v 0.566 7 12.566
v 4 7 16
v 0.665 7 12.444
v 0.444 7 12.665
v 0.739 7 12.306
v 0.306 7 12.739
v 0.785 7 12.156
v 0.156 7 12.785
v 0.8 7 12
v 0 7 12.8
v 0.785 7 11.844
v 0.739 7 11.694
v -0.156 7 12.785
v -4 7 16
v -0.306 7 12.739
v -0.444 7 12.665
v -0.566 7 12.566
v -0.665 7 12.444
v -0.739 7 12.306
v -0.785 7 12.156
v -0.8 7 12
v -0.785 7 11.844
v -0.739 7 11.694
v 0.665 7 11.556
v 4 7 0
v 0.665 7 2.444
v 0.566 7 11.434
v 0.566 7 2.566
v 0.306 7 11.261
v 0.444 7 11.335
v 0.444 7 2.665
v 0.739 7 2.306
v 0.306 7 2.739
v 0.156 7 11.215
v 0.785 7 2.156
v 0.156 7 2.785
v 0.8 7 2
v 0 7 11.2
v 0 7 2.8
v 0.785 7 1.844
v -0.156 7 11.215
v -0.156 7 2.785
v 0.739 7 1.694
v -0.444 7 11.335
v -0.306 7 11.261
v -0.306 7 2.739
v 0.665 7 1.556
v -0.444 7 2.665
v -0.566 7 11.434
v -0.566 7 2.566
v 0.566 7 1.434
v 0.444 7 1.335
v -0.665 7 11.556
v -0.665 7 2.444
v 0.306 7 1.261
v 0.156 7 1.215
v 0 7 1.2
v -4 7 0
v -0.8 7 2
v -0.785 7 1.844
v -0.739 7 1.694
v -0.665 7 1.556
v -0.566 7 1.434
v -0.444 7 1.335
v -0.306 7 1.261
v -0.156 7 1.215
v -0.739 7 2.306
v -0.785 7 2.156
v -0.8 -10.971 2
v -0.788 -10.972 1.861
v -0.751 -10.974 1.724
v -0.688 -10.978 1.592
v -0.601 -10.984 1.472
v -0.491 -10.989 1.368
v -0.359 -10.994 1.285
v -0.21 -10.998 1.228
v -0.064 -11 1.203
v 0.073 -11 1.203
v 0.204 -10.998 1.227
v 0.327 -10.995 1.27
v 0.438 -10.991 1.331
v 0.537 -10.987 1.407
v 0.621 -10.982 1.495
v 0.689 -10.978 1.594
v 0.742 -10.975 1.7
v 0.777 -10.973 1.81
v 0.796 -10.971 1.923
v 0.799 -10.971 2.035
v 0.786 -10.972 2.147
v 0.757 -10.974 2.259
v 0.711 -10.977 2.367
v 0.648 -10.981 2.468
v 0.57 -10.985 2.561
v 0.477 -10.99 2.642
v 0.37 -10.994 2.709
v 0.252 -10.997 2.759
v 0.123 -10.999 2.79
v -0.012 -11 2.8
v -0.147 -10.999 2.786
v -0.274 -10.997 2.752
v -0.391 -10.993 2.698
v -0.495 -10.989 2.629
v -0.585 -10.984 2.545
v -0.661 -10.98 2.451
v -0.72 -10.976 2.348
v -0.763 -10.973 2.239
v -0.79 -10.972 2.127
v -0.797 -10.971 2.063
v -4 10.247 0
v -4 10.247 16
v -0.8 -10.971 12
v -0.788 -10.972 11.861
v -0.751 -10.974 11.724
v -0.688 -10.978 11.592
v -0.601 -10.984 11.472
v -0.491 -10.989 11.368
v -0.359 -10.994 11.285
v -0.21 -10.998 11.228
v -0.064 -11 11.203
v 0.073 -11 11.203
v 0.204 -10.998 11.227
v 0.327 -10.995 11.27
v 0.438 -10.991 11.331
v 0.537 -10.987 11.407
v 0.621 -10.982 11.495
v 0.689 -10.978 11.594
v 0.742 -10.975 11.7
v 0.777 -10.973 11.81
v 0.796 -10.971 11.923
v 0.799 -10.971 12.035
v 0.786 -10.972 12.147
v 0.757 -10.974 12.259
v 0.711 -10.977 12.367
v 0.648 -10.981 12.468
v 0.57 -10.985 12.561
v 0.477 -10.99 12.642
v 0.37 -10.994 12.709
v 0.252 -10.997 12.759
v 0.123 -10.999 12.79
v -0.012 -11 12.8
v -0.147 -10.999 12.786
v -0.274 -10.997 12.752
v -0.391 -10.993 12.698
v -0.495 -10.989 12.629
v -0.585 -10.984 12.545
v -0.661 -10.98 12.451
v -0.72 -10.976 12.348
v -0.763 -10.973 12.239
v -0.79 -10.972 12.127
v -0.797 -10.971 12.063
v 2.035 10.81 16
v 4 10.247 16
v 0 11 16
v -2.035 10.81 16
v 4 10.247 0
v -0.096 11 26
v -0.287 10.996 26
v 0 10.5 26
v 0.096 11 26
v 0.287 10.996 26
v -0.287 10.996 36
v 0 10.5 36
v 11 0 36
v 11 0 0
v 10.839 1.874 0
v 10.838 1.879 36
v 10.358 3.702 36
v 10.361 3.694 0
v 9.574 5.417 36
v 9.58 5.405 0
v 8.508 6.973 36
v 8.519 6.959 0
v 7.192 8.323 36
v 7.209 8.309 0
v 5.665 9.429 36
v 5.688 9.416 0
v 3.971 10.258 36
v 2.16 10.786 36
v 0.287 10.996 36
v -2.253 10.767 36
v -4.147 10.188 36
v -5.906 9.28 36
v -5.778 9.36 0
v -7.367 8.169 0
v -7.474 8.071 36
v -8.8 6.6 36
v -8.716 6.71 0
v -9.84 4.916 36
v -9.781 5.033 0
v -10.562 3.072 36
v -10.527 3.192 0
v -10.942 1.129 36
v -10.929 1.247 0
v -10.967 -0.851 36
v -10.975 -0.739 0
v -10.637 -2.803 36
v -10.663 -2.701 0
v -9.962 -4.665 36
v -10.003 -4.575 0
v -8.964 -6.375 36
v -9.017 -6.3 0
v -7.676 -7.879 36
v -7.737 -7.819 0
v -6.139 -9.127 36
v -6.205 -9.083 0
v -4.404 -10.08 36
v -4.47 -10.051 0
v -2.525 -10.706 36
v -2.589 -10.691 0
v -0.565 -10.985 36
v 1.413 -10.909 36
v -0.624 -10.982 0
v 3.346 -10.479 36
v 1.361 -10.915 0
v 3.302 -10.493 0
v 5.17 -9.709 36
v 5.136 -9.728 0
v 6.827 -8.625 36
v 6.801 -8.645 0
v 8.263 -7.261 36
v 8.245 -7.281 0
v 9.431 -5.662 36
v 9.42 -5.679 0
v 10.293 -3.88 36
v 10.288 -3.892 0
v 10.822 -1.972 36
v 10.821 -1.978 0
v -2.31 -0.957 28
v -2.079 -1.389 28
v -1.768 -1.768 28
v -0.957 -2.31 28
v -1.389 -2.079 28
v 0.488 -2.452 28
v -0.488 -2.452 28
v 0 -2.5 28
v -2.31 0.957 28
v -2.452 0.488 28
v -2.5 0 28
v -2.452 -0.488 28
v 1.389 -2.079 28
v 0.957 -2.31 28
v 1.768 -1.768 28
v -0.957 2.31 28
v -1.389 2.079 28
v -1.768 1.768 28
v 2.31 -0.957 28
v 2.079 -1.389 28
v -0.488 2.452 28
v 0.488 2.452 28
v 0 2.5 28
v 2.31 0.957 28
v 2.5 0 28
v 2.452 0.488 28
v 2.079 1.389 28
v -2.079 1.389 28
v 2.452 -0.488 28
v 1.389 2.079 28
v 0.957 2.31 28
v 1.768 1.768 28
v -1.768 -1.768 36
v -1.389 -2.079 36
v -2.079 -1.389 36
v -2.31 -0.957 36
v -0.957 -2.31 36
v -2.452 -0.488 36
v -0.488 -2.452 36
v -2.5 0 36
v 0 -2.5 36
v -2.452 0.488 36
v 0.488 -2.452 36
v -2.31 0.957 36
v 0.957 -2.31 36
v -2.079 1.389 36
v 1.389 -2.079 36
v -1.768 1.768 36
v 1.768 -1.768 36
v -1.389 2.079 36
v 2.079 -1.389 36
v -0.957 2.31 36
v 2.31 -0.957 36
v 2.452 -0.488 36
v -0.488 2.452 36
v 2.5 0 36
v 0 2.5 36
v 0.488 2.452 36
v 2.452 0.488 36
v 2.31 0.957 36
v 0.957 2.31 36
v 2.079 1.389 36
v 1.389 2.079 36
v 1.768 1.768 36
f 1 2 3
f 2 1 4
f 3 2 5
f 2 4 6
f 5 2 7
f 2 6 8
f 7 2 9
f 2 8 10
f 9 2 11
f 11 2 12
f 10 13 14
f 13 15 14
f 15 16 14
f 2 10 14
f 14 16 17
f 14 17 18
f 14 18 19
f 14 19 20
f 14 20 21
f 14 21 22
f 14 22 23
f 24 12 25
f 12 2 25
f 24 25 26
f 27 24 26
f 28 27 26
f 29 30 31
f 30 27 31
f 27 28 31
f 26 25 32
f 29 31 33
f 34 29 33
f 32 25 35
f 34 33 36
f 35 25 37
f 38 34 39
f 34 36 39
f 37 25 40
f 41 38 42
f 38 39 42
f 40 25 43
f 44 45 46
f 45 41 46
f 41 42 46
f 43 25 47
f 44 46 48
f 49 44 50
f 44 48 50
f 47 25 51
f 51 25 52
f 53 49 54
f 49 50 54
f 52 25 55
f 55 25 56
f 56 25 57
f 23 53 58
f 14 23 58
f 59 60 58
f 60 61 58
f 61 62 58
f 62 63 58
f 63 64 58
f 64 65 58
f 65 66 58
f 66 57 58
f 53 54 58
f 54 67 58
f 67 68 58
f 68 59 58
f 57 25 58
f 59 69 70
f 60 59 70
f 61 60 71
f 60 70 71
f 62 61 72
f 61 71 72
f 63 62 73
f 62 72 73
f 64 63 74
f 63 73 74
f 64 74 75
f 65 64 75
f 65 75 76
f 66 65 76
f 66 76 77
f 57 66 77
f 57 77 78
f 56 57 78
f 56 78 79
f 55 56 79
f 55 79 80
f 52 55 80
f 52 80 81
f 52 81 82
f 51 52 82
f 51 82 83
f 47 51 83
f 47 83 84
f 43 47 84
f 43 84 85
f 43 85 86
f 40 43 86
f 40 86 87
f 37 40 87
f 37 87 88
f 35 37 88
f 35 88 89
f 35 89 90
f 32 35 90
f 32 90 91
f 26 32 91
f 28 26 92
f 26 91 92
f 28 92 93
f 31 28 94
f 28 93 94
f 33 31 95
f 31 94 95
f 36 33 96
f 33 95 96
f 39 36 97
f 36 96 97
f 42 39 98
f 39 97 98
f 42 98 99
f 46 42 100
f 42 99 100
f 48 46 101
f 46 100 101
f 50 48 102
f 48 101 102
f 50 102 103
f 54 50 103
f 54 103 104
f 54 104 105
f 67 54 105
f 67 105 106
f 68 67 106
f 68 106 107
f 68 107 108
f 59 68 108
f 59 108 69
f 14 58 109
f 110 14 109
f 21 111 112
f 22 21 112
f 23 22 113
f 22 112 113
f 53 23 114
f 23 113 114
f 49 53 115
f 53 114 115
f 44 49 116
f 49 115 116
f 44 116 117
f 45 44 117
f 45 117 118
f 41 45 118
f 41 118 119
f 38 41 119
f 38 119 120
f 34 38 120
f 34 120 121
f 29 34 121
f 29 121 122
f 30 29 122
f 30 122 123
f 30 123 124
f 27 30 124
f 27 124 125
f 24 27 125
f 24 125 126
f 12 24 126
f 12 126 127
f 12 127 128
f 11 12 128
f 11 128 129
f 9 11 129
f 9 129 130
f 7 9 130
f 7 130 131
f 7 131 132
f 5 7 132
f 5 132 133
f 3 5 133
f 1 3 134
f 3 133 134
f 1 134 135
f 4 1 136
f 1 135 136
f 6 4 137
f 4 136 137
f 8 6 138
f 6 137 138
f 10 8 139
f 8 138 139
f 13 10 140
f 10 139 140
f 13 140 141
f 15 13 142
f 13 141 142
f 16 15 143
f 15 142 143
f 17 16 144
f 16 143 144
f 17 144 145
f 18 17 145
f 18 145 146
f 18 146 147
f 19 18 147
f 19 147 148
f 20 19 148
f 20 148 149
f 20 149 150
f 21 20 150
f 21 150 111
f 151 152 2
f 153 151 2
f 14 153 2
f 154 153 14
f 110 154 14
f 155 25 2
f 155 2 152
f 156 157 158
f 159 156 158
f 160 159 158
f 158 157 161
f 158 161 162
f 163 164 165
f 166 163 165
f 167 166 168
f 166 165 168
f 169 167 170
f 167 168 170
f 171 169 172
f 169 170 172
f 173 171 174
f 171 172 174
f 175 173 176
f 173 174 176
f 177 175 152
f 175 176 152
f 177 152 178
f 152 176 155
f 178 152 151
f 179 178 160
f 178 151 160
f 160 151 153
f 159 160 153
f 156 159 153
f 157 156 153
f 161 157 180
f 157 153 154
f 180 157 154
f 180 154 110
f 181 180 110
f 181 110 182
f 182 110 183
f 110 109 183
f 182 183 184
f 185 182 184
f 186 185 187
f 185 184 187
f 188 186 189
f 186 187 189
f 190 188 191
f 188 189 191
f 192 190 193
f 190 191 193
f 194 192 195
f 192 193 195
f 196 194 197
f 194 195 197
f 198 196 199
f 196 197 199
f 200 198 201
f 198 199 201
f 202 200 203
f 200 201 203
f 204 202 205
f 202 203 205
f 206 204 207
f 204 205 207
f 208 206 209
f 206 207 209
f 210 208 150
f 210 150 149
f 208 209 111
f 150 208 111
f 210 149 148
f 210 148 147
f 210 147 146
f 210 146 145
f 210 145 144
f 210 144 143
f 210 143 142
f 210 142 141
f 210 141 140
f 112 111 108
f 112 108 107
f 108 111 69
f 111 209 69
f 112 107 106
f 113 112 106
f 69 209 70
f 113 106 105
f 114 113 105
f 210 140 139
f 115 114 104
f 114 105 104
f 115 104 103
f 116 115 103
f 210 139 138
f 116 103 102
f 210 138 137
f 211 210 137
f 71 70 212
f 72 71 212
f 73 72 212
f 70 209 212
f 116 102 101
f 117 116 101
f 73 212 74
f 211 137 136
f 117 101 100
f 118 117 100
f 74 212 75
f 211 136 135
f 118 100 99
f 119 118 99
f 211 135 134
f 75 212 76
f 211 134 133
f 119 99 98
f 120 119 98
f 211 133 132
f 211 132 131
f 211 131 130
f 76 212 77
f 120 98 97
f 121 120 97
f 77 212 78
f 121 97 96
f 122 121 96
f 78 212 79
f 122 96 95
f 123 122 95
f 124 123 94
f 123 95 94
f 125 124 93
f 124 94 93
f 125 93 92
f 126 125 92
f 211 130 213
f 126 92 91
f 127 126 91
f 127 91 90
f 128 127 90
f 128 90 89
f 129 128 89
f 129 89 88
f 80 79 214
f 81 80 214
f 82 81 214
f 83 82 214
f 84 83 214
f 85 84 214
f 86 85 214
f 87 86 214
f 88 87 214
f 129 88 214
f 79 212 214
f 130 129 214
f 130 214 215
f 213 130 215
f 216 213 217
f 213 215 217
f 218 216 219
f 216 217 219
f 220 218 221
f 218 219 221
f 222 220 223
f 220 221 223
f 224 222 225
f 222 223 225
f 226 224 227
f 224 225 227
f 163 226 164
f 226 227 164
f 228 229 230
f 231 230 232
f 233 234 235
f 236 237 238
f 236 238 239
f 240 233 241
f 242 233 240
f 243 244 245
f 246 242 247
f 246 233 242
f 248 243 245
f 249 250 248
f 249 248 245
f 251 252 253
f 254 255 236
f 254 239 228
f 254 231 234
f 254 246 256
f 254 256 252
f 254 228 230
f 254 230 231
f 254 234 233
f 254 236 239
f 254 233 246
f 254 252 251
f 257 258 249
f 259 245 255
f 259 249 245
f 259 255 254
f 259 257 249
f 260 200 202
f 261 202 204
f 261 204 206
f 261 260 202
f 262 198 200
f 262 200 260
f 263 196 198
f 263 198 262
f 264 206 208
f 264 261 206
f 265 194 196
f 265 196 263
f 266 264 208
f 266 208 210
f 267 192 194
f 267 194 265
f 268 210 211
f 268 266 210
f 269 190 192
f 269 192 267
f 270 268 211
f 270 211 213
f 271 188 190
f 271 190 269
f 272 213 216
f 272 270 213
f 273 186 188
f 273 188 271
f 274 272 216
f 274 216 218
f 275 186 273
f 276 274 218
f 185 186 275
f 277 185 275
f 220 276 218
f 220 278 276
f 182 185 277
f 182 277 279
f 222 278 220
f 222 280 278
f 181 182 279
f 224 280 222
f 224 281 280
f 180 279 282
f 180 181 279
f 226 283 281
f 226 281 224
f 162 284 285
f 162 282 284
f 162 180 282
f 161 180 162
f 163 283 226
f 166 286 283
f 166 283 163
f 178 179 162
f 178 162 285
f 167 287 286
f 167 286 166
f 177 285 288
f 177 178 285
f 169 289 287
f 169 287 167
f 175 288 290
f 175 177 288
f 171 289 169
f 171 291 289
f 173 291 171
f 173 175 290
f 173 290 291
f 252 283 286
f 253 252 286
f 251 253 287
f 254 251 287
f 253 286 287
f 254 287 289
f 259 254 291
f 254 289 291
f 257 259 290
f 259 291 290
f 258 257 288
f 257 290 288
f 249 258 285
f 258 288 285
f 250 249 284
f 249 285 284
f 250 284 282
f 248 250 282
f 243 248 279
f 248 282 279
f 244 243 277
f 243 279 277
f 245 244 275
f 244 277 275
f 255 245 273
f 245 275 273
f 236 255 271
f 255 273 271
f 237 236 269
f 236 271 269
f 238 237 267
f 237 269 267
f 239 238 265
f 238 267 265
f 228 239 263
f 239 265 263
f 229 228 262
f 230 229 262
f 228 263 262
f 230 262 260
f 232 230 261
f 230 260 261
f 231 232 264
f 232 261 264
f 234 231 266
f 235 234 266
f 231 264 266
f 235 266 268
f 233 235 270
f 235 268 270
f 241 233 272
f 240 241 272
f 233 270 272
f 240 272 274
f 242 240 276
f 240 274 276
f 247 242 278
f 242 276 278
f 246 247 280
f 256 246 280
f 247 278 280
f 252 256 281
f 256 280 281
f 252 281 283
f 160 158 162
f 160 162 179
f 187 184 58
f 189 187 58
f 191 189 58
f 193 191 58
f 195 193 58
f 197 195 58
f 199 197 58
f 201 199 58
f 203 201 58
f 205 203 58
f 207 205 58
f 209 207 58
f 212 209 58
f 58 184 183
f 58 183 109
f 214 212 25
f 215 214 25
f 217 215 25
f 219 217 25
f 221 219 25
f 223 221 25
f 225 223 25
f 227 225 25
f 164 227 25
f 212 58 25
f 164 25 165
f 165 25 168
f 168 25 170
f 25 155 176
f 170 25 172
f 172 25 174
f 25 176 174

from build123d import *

# Parameters (mm, degrees)
SKETCH1_R             = 11
BOSS_EXTRUDE1_DEPTH   = 36
SKETCH2_W             = 8
SKETCH2_H             = 30
CUT_EXTRUDE1_DEPTH    = 16
CUT_EXTRUDE3_START    = -10
CUT_EXTRUDE3_DEPTH    = 10
M2X0_4_TAPPED_HOLE3_D = 1.6
SKETCH16_R            = 2.5
CUT_EXTRUDE4_DEPTH    = 8


with BuildPart() as part:
    # Sketch1 → Boss-Extrude1 (new body)
    with BuildSketch(Plane.XY):
        Circle(SKETCH1_R)
    extrude(amount=BOSS_EXTRUDE1_DEPTH)

    # Sketch2 → Cut-Extrude1 (cut)
    with BuildSketch(Plane(origin=(0, 0, 0), x_dir=(-1, 0, 0), z_dir=(0, 0, -1))):
        with Locations((0, 22)):
            Rectangle(SKETCH2_W, SKETCH2_H)
    extrude(amount=-CUT_EXTRUDE1_DEPTH, mode=Mode.SUBTRACT)

    # Sketch6 → Cut-Extrude3 (cut)
    with BuildSketch(Plane.XY.offset(36).offset(CUT_EXTRUDE3_START)):
        with BuildLine():
            Line((-0.286520362, 10.996267825), (0, 10.5))
            Line((0, 10.5), (0.286520362, 10.996267825))
            ThreePointArc((0.286520362, 10.996267825), (0, 11), (-0.286520362, 10.996267825))
        make_face()
    extrude(amount=CUT_EXTRUDE3_DEPTH, mode=Mode.SUBTRACT)

    # M2x0.4 Tapped Hole3 (through all)
    with Locations(Plane(origin=(0, 7, 0), x_dir=(1, 0, 0), z_dir=(0, 1, 0))):
        with Locations((0, -12), (0, -2)):
            Hole(M2X0_4_TAPPED_HOLE3_D / 2)

    # Sketch16 → Cut-Extrude4 (cut)
    with BuildSketch(Plane.XY.offset(36)):
        Circle(SKETCH16_R)
    extrude(amount=-CUT_EXTRUDE4_DEPTH, mode=Mode.SUBTRACT)


solid = part.part
